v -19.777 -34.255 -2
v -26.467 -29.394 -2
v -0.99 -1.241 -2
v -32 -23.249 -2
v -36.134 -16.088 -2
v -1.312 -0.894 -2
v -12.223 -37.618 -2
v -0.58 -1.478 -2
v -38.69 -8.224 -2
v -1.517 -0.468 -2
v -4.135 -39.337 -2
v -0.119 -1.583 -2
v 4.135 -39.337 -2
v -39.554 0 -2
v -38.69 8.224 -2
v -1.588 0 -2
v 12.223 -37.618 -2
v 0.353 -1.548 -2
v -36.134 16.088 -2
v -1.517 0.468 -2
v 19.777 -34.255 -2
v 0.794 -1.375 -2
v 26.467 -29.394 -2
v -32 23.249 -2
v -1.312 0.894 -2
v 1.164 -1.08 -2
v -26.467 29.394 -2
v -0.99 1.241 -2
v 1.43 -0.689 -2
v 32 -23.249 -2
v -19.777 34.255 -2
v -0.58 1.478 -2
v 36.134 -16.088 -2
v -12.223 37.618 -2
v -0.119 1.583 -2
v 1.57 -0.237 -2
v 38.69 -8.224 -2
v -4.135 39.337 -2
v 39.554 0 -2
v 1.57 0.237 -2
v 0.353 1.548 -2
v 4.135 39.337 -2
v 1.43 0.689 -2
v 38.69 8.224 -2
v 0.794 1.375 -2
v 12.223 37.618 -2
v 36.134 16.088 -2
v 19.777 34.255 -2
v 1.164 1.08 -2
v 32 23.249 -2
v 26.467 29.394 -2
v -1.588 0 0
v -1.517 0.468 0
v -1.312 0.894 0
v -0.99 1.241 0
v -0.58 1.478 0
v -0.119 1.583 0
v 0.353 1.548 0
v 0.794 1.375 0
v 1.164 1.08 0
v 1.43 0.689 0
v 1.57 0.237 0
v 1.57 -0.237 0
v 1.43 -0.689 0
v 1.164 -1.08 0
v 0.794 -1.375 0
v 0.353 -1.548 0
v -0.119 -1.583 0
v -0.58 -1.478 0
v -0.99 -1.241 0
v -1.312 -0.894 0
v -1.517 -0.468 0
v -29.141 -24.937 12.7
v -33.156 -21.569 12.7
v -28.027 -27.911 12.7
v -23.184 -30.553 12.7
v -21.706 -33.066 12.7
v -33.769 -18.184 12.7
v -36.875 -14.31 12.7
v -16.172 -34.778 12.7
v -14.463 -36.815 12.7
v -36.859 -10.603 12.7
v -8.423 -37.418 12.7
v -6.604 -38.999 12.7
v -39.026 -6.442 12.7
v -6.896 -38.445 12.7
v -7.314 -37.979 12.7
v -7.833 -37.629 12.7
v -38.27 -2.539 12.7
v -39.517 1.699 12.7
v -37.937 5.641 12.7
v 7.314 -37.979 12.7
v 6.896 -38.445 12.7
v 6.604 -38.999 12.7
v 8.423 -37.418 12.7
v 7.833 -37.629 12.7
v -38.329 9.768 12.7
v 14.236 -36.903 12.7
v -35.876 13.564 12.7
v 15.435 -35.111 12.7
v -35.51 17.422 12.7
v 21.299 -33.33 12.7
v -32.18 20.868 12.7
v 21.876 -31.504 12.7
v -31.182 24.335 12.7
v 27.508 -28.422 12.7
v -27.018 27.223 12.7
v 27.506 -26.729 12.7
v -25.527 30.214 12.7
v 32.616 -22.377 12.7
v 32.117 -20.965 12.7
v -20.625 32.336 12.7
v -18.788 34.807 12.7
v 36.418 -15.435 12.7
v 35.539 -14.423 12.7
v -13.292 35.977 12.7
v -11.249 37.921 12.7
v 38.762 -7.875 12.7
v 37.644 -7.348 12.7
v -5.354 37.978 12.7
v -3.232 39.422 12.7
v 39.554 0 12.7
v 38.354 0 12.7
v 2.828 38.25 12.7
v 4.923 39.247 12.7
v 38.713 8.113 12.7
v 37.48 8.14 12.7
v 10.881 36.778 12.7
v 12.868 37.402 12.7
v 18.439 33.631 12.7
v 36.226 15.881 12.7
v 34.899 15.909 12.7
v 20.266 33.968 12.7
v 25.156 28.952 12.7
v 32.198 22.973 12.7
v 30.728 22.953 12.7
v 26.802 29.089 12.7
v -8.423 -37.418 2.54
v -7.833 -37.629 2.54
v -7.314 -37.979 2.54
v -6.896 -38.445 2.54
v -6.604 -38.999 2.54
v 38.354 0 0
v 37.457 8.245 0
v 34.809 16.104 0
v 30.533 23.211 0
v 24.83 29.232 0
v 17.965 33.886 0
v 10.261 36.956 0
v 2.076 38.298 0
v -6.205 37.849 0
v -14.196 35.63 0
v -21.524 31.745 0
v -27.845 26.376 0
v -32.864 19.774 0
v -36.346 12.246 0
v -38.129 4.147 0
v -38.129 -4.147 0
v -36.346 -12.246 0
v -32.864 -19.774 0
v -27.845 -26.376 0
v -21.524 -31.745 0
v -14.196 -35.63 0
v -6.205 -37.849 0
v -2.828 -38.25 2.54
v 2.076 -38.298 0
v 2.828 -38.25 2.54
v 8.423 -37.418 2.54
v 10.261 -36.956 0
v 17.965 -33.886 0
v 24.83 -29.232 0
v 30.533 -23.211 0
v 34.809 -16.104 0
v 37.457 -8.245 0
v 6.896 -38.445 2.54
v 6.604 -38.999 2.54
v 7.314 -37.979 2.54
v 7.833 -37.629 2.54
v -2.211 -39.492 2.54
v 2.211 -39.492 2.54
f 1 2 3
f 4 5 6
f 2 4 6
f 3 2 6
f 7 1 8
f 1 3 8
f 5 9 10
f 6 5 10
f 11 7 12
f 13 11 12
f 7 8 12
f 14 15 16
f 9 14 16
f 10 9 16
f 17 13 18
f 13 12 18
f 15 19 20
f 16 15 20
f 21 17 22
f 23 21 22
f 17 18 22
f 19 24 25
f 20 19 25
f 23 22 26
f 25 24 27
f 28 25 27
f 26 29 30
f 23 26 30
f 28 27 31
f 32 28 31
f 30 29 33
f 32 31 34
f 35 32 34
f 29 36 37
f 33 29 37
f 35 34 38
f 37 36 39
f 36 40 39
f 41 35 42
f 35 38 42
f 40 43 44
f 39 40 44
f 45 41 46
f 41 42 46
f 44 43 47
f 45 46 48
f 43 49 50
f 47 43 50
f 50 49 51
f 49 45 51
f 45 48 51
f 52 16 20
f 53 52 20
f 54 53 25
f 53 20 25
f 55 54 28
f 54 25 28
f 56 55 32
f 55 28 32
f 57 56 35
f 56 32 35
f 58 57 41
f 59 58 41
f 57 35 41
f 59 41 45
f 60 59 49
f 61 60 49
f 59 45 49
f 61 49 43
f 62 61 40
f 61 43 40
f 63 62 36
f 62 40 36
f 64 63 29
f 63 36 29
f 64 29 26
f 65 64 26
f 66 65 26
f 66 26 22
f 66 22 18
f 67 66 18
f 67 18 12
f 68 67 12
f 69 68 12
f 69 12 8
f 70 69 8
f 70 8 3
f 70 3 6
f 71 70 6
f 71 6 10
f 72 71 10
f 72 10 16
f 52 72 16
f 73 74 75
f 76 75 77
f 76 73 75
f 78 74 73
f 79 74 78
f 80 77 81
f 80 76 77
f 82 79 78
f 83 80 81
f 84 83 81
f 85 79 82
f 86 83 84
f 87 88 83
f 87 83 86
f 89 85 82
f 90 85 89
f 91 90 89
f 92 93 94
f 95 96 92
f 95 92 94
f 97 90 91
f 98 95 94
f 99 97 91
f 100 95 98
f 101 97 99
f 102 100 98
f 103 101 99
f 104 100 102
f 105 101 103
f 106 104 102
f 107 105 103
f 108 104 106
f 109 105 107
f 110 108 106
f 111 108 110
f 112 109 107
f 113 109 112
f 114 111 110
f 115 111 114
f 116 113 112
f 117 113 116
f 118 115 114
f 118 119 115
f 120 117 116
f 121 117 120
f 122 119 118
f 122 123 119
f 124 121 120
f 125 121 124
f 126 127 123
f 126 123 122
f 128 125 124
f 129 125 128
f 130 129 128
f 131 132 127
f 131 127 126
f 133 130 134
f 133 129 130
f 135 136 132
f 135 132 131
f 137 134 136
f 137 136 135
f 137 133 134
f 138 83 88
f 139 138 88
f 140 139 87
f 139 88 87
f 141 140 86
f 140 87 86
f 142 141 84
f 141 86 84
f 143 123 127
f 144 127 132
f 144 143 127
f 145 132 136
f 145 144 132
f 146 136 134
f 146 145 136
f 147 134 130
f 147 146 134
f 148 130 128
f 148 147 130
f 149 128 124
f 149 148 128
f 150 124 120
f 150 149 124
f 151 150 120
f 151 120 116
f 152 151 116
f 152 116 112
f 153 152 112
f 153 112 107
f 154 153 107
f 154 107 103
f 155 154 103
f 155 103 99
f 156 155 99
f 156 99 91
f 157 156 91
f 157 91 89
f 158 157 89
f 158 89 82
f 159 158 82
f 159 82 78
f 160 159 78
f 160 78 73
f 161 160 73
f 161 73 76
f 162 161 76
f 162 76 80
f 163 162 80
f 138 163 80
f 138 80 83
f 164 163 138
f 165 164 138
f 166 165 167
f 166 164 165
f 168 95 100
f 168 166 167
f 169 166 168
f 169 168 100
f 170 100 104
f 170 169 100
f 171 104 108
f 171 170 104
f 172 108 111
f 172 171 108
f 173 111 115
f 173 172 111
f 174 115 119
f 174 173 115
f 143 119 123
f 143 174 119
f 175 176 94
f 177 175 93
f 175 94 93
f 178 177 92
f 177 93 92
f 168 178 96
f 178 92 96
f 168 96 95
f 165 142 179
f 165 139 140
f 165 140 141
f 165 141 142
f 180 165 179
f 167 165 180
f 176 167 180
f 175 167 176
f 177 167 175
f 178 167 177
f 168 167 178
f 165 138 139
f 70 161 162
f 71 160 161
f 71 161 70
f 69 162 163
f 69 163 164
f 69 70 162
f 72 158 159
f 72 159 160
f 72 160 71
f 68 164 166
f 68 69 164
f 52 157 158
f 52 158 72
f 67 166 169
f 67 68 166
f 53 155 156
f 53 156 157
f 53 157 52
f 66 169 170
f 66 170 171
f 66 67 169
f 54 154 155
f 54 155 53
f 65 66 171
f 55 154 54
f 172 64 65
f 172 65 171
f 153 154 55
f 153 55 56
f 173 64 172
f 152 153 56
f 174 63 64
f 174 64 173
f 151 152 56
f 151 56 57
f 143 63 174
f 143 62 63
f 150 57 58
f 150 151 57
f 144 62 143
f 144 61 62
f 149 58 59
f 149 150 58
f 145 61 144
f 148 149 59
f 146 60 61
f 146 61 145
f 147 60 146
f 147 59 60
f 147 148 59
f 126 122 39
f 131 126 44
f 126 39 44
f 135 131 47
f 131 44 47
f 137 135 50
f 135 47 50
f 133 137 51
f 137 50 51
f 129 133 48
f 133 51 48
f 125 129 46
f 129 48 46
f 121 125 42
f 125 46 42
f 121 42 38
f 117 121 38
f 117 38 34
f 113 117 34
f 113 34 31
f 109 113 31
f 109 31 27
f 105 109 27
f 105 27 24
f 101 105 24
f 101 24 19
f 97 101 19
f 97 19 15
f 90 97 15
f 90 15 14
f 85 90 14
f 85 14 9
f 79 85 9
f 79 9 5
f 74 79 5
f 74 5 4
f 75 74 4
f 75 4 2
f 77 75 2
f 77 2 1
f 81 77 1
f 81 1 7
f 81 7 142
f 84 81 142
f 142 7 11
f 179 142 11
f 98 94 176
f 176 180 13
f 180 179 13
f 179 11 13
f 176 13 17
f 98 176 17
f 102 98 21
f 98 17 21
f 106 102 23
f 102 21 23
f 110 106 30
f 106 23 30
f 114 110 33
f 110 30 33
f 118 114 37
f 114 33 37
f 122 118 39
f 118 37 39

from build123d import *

# Parameters (mm, degrees)
SKETCH2_R           = 39.554
SKETCH2_R_2         = 38.354
BOSS_EXTRUDE1_DEPTH = 12.7
BOSS_EXTRUDE2_START = -2
SKETCH2_2_R         = 39.554
BOSS_EXTRUDE2_DEPTH = 2
SKETCH4_R           = 1.5875
CUT_EXTRUDE1_DEPTH  = 58.837080078
CUT_EXTRUDE3_REACH  = 59.361
SKETCH5_W           = 13.208
SKETCH5_H           = 10.16
FILLET1_R           = 2.54


with BuildPart() as part:
    # Sketch2 → Boss-Extrude1 (new body)
    with BuildSketch(Plane.XY):
        Circle(SKETCH2_R)
        Circle(SKETCH2_R_2, mode=Mode.SUBTRACT)
    extrude(amount=BOSS_EXTRUDE1_DEPTH)

    # Sketch2<2> → Boss-Extrude2 (add)
    with BuildSketch(Plane.XY.offset(BOSS_EXTRUDE2_START)):
        Circle(SKETCH2_2_R)
    extrude(amount=BOSS_EXTRUDE2_DEPTH)

    # Sketch4 → Cut-Extrude1 (cut, through all)
    with BuildSketch(Plane(origin=(0, 0, -2), x_dir=(-1, 0, 0), z_dir=(0, 0, -1))):
        Circle(SKETCH4_R)
    extrude(amount=-CUT_EXTRUDE1_DEPTH, mode=Mode.SUBTRACT)

    # Sketch5 → Cut-Extrude3 (cut, up to next)
    with BuildSketch(Plane(origin=(0, 0, 0), x_dir=(1, 0, 0), z_dir=(0, 1, 0)), mode=Mode.PRIVATE) as cut_extrude3_sk1:
        with Locations((0, -7.62)):
            Rectangle(SKETCH5_W, SKETCH5_H)
    cut_extrude3_tool1 = extrude(cut_extrude3_sk1.sketch, amount=-CUT_EXTRUDE3_REACH, mode=Mode.PRIVATE) & part.part
    add(cut_extrude3_tool1.solids().sort_by_distance((0, 0, 7.62))[0], mode=Mode.SUBTRACT)

    # Fillet1
    # the kernel refuses this fillet: 2.54 mm, written as the material it takes off along each edge
    with BuildSketch(Plane(origin=(-6.604, -37.781165943, 17.336288805), x_dir=(0, -1, 0), z_dir=(0, 0, -1))) as fillet1_piece_1:
        with BuildLine():
            CenterArc((2.114605309, 2.376349225), FILLET1_R, 192.685578689, 56.634940698)
            Line((-0.363392905, 1.818563559), (-0.41295287, 1.807407846))
            ThreePointArc((-0.41295287, 1.807407846), (-0.220518494, 0.901524198), (-0.050041279, -0.00874702))
            Line((-0.050041279, -0.00874702), (0, -0.0508))
            ThreePointArc((0, -0.0508), (0.608815096, -0.0508), (1.19969069, -0.047526985))
            Line((1.19969069, -0.047526985), (1.217630192, 0))
        make_face()
    extrude(amount=14.796288805, mode=Mode.SUBTRACT)
    with BuildSketch(Plane(origin=(6.604, -37.781165943, 17.336288805), x_dir=(0, -1, 0), z_dir=(0, 0, -1))) as fillet1_piece_2:
        with BuildLine():
            CenterArc((2.114605309, -2.376349225), FILLET1_R, 110.679480614, 56.634940698)
            Line((-0.363392905, -1.818563559), (-0.41295287, -1.807407846))
            ThreePointArc((-0.41295287, -1.807407846), (-0.220518494, -0.901524198), (-0.050041279, 0.00874702))
            Line((-0.050041279, 0.00874702), (0, 0.0508))
            ThreePointArc((0, 0.0508), (0.608815096, 0.0508), (1.19969069, 0.047526985))
            Line((1.19969069, 0.047526985), (1.217630192, 0))
        make_face()
    extrude(amount=14.796288805, mode=Mode.SUBTRACT)


solid = part.part
